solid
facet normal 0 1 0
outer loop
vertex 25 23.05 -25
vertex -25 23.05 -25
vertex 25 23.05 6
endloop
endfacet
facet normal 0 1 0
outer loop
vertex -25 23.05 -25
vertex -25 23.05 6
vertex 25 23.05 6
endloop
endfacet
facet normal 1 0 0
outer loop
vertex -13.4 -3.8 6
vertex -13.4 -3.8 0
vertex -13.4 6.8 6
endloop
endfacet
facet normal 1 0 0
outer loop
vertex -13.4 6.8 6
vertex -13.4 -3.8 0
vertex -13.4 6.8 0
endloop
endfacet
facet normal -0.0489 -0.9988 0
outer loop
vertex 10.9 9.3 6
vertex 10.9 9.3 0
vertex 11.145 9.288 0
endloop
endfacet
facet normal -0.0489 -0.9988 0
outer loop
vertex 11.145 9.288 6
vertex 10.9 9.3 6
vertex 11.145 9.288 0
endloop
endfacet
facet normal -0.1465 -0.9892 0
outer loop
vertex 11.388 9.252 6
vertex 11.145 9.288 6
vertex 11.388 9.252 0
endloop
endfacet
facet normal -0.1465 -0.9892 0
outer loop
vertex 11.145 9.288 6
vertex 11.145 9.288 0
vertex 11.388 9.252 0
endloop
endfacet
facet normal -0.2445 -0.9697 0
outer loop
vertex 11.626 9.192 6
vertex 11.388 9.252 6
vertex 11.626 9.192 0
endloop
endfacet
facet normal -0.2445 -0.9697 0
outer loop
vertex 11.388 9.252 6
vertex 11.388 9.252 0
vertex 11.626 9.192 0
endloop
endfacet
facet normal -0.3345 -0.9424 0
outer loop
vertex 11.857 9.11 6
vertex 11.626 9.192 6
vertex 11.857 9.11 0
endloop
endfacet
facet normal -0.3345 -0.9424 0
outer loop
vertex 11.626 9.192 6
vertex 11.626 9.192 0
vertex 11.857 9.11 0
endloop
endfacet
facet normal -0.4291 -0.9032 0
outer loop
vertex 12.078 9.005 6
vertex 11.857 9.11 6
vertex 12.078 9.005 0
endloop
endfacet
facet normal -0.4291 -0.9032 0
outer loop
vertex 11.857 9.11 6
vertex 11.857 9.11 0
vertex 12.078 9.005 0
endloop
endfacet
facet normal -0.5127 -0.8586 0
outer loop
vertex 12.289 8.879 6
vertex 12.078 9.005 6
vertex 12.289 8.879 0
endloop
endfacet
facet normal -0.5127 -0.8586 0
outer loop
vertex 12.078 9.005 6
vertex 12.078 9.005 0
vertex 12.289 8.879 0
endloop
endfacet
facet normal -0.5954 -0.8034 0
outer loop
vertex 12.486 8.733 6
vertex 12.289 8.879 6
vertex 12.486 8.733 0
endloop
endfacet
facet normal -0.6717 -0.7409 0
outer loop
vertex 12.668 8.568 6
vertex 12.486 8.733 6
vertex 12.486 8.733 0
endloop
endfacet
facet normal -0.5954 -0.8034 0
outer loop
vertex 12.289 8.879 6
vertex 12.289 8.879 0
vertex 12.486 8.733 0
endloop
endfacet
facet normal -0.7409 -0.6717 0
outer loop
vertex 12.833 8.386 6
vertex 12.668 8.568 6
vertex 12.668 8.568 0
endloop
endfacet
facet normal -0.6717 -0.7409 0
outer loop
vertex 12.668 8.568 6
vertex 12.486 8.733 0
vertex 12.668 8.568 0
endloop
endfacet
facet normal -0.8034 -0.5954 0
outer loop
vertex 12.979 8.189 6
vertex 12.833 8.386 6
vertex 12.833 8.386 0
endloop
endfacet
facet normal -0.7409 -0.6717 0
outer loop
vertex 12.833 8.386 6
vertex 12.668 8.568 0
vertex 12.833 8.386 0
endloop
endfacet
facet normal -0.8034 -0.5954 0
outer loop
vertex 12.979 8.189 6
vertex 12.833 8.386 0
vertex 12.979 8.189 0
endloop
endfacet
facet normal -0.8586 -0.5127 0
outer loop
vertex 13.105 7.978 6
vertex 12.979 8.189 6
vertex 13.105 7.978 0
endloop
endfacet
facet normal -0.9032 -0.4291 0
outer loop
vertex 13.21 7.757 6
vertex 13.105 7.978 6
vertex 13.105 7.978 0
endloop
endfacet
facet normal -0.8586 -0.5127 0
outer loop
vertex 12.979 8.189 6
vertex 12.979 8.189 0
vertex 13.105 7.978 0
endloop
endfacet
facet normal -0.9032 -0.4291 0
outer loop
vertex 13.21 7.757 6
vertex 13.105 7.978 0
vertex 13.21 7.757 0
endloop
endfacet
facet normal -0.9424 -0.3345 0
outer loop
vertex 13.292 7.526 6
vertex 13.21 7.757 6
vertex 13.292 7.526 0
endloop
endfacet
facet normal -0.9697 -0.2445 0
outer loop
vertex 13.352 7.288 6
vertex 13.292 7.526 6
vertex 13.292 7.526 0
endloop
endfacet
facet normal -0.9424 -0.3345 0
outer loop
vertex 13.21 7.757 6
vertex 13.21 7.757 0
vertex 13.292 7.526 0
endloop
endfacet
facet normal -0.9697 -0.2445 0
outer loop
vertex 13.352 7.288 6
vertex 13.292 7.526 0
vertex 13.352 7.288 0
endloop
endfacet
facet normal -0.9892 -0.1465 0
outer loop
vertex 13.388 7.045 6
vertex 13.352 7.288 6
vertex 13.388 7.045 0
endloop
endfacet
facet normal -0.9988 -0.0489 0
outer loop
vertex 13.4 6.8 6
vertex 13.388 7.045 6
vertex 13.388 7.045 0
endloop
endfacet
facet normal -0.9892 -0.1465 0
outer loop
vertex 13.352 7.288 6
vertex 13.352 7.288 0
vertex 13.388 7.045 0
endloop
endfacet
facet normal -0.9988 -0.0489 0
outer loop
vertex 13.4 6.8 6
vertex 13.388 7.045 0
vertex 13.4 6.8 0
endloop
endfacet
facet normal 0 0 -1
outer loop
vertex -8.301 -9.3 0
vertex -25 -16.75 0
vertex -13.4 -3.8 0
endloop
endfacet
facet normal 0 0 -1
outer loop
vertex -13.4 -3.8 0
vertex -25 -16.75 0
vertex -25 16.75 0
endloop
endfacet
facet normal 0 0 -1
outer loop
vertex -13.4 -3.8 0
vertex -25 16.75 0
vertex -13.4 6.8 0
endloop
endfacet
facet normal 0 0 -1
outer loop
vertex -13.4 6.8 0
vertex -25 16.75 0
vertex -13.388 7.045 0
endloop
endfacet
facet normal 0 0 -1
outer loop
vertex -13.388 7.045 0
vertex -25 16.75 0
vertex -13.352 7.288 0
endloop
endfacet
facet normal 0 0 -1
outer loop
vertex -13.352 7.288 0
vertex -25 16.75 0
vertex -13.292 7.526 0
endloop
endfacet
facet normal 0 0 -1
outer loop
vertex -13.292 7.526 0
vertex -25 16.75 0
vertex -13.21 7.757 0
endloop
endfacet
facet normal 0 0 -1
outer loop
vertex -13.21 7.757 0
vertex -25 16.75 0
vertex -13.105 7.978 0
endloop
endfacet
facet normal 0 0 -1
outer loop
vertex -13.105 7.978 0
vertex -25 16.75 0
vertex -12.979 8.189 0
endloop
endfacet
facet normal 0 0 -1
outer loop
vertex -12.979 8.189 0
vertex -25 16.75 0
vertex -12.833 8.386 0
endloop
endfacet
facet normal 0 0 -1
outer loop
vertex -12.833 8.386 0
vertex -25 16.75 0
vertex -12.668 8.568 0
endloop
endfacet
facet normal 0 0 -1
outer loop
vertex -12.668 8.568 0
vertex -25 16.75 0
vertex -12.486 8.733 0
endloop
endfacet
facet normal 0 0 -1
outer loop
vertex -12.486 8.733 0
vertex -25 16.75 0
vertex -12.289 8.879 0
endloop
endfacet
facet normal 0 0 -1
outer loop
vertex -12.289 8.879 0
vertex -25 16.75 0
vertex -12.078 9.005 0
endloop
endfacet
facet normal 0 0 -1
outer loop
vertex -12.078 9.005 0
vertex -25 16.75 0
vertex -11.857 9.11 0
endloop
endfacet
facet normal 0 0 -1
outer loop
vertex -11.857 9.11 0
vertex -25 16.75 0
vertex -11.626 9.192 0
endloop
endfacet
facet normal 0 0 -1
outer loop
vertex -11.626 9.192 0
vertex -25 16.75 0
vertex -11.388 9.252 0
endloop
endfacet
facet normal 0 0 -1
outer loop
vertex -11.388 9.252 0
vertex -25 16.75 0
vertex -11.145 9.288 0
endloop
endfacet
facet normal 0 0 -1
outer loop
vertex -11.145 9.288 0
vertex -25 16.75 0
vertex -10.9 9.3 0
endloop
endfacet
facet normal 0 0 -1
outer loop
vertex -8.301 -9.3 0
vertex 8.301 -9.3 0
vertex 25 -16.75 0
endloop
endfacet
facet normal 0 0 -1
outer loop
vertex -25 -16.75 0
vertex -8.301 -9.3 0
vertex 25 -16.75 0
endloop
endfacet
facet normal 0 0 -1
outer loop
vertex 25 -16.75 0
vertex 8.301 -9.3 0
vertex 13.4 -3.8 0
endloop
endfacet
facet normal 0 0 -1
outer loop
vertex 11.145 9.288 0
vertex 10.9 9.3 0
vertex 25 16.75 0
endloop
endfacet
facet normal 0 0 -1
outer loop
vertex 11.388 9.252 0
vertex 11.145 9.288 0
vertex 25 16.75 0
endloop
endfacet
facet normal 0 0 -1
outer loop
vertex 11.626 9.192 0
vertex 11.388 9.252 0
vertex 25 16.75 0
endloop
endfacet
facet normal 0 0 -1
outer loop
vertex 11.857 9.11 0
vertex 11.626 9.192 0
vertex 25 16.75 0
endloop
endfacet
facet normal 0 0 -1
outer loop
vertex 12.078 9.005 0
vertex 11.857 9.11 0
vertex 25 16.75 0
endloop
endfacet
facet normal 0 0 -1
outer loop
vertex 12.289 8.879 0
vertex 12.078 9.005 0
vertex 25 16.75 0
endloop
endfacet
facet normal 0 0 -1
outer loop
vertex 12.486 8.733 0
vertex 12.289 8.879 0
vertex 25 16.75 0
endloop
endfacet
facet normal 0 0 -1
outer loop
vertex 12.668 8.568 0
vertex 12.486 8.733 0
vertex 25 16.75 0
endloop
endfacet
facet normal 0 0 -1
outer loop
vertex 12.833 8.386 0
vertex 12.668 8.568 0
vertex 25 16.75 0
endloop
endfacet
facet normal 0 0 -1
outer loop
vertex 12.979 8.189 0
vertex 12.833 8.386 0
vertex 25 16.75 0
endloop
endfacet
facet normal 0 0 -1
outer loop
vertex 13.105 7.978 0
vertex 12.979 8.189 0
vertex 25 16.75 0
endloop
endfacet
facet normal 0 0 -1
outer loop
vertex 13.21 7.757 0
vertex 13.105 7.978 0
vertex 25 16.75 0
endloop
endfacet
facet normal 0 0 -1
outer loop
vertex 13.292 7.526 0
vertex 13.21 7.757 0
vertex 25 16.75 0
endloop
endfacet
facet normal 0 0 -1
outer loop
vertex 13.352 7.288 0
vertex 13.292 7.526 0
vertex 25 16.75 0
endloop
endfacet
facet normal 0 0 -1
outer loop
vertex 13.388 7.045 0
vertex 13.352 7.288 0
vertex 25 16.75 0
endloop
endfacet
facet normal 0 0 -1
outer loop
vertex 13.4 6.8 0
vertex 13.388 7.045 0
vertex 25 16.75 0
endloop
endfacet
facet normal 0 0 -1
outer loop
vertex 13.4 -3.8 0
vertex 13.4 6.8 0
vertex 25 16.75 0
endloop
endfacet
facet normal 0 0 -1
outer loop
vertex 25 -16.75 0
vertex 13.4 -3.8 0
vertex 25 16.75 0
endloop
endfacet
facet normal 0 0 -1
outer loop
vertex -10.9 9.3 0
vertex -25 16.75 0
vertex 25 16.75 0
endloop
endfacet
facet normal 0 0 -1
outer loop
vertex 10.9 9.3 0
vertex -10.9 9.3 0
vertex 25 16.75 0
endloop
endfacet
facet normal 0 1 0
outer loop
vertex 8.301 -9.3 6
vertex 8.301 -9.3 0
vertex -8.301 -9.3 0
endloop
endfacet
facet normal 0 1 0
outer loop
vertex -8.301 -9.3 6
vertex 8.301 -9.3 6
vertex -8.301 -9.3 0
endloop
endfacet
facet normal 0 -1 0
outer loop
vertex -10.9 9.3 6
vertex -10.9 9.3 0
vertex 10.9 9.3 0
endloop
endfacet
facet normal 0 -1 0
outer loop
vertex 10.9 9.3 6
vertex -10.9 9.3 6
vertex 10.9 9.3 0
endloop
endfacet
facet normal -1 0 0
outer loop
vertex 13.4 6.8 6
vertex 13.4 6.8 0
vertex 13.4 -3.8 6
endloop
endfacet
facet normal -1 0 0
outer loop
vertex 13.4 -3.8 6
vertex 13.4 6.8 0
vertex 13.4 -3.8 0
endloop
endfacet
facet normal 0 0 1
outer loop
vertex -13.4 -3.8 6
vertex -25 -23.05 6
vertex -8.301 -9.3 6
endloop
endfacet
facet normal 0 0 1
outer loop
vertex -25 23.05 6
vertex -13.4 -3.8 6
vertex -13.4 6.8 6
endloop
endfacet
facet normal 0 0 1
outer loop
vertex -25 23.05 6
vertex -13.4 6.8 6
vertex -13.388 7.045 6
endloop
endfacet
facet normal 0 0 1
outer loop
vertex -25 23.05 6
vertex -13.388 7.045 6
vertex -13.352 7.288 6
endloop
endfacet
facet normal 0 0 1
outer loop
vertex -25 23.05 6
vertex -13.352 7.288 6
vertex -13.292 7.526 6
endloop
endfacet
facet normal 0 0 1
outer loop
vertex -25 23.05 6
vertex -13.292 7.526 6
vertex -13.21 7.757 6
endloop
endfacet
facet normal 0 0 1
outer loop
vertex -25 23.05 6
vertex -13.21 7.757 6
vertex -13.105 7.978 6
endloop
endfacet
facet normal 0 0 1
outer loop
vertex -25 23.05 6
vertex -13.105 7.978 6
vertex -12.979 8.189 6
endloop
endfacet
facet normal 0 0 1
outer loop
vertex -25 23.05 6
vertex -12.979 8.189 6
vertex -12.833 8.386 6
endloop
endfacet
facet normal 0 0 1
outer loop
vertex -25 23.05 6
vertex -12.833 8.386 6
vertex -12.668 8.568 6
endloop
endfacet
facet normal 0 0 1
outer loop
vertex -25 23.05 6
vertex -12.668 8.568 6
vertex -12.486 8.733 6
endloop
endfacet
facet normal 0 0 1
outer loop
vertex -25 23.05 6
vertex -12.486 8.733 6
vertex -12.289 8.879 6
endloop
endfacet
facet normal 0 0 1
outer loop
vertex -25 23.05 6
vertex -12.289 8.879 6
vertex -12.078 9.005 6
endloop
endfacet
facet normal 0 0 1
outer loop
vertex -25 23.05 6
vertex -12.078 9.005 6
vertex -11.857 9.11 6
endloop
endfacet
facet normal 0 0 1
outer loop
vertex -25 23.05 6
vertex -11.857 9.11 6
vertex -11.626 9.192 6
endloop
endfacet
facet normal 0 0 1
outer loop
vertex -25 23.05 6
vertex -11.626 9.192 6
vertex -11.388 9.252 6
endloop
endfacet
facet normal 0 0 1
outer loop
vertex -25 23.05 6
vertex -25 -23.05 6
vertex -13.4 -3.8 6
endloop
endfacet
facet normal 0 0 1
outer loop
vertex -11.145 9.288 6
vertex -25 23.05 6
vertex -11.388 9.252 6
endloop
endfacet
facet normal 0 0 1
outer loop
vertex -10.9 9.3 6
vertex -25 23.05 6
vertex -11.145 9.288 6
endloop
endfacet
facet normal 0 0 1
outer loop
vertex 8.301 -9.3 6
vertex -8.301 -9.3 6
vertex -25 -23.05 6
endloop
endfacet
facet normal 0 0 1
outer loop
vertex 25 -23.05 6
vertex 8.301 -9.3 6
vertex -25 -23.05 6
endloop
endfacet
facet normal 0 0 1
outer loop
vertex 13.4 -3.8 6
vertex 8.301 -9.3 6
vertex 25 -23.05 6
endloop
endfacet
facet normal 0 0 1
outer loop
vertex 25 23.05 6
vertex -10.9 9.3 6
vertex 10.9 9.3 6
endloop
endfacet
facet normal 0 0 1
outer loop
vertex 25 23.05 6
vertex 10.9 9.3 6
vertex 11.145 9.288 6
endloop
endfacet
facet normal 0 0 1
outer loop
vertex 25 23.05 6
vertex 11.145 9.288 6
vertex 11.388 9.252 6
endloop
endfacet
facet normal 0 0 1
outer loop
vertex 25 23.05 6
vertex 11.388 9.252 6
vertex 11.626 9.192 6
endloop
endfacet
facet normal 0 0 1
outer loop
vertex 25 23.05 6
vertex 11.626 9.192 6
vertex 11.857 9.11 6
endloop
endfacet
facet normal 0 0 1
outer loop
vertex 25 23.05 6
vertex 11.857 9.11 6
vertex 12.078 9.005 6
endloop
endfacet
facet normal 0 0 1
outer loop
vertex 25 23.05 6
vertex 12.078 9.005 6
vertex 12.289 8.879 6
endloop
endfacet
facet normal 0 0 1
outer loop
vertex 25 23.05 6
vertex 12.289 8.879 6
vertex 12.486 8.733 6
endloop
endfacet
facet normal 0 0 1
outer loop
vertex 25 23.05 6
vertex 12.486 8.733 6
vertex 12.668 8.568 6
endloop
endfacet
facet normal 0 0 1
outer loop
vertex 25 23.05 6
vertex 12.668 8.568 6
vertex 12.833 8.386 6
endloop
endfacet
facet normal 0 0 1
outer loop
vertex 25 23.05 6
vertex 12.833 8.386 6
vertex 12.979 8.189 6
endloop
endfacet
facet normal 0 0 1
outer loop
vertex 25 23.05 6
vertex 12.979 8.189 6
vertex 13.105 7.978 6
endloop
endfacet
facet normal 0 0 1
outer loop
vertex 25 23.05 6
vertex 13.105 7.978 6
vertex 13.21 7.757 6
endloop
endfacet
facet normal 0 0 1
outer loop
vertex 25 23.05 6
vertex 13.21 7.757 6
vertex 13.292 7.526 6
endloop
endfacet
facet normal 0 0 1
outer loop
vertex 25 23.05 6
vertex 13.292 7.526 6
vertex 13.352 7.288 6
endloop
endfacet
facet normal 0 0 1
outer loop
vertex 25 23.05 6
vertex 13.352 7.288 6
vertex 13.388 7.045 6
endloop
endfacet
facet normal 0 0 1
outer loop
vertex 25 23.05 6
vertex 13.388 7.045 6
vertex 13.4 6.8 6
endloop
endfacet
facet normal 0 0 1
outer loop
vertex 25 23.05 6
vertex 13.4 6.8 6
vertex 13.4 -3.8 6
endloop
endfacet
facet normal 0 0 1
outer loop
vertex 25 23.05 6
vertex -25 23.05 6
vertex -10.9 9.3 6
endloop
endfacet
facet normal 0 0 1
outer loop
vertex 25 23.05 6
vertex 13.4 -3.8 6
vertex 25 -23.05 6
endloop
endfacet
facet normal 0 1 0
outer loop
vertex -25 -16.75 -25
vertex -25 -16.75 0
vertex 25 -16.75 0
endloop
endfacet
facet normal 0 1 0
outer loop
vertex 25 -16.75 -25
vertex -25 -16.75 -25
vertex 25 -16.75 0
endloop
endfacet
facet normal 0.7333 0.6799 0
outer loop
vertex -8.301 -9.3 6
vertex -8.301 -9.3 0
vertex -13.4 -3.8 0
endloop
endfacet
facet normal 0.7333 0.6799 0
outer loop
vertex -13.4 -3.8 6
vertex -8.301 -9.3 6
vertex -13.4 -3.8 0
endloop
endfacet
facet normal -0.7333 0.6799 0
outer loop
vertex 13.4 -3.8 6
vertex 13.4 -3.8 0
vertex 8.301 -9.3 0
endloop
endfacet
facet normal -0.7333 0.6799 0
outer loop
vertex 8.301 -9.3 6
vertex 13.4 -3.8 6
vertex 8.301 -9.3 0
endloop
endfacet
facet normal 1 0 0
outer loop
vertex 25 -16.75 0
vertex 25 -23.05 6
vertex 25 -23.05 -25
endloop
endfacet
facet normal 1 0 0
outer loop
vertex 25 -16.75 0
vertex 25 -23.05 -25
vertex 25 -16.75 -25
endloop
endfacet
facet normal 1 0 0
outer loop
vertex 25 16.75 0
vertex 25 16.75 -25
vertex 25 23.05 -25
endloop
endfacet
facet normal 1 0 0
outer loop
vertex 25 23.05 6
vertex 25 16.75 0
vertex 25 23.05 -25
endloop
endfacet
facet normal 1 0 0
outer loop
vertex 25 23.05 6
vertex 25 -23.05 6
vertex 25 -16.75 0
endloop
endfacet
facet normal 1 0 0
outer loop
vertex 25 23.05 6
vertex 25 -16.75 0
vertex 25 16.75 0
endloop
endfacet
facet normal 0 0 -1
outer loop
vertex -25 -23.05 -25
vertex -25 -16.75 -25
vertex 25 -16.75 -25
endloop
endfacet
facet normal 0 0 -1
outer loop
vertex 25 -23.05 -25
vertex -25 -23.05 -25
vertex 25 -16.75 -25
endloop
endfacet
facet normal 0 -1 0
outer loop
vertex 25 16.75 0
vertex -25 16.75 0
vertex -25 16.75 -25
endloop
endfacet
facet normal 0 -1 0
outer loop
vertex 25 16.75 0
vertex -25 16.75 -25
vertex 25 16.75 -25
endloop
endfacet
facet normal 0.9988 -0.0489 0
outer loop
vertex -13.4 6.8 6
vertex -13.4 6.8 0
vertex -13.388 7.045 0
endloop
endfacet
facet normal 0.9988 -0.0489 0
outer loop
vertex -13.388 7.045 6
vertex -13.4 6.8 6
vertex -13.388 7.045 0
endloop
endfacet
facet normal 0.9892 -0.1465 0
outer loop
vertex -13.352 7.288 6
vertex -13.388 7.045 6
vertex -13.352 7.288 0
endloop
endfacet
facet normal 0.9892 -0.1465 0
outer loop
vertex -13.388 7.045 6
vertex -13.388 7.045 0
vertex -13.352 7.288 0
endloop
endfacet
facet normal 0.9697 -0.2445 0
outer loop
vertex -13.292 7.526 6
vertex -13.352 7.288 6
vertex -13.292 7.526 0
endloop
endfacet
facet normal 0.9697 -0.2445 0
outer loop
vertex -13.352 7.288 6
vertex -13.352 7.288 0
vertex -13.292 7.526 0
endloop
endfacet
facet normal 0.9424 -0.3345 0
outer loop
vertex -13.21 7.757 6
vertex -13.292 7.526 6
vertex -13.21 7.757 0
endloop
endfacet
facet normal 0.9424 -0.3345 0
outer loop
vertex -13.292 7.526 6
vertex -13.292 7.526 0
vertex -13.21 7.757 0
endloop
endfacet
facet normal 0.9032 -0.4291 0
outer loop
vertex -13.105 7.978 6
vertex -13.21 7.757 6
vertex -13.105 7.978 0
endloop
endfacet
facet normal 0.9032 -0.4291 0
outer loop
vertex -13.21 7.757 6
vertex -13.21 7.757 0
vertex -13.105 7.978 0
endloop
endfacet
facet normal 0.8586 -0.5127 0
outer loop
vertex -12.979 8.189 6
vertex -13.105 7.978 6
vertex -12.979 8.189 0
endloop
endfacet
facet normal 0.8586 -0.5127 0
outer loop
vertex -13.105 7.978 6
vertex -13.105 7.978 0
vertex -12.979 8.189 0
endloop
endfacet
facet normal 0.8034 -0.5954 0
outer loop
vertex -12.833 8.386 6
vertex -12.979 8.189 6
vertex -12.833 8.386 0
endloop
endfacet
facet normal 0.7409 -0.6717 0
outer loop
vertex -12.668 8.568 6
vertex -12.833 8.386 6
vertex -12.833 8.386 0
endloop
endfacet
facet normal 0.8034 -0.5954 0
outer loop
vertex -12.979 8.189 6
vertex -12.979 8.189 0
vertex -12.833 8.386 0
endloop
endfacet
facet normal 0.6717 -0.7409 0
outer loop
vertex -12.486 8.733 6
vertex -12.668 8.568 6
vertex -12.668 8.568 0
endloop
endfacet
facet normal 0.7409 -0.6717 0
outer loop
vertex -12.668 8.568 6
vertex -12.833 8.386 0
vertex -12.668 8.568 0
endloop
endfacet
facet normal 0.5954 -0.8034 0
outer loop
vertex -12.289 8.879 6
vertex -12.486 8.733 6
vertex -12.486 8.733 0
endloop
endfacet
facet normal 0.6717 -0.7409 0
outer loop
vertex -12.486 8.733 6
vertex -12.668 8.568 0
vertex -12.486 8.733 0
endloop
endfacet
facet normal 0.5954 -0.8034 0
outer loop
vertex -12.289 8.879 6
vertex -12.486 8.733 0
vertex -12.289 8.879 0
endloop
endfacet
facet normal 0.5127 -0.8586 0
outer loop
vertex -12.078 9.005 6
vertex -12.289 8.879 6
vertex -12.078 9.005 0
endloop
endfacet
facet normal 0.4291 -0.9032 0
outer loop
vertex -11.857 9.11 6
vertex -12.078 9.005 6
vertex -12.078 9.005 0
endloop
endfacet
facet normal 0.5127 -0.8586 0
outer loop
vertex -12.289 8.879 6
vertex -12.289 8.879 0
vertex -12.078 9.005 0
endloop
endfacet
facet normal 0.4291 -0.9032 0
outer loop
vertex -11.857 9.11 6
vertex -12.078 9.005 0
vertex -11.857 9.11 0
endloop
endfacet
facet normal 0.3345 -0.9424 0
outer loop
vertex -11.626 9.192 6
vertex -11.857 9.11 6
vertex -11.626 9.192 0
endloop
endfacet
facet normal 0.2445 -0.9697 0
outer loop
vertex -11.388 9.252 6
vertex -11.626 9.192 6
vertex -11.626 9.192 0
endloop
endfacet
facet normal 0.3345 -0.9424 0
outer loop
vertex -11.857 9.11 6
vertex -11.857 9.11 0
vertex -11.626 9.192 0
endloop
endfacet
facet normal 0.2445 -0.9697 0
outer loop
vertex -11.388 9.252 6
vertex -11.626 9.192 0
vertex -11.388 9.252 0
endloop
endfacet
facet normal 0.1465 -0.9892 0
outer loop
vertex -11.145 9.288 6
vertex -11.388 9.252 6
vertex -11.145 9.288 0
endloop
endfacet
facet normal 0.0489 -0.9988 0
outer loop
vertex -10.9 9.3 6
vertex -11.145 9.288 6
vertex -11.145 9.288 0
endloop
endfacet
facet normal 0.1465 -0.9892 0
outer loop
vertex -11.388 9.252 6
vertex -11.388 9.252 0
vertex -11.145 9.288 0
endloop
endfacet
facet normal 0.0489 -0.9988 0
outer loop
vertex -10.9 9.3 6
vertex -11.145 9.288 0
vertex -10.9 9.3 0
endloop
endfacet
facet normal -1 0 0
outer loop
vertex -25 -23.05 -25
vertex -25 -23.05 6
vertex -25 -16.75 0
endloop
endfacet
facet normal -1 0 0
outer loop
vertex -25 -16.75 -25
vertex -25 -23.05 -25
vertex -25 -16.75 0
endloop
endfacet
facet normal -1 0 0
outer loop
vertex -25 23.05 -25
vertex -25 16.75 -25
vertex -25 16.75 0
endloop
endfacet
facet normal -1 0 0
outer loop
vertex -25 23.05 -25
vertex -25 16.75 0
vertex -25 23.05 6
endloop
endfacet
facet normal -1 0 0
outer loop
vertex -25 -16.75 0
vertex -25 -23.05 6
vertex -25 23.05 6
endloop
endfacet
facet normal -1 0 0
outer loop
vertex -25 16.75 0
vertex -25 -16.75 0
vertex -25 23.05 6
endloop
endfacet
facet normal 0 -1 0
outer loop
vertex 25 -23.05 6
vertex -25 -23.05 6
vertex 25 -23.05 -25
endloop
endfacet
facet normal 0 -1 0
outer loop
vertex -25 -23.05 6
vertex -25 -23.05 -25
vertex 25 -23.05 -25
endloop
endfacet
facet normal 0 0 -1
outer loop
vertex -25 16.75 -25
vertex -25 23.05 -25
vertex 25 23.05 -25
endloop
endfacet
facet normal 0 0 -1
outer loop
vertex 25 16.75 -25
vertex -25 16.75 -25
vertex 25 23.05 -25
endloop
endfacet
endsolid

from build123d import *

# Parameters (mm, degrees)
F0_W     = 50
F0_H     = 46.1
F0_R     = 1.75
F1_DEPTH = 6
F2_W     = 50
F2_H     = 6.3
F3_DEPTH = 25


with BuildPart() as f1:
    # F0 (on Top) → F1 (new body)
    with BuildSketch(Plane.XY):
        Rectangle(F0_W, F0_H)
        with Locations((-19.95, 0)):
            Circle(F0_R, mode=Mode.SUBTRACT)
        with BuildLine():
            ThreePointArc((-13.4, 6.8), (-12.667767, 8.567767), (-10.9, 9.3))
            Line((-10.9, 9.3), (10.9, 9.3))
            ThreePointArc((10.9, 9.3), (12.667767, 8.567767), (13.4, 6.8))
            Line((13.4, 6.8), (13.4, -3.8))
            Line((13.4, -3.8), (8.30098, -9.3))
            Line((8.30098, -9.3), (-8.30098, -9.3))
            Line((-8.30098, -9.3), (-13.4, -3.8))
            Line((-13.4, -3.8), (-13.4, 6.8))
        make_face(mode=Mode.SUBTRACT)
        with Locations((19.95, 0)):
            Circle(F0_R, mode=Mode.SUBTRACT)
        with Locations((-19.95, 0)):
            Circle(F0_R)
        with Locations((19.95, 0)):
            Circle(F0_R)
    extrude(amount=F1_DEPTH)

    # F2 (on face) → F3 (join)
    with BuildSketch(Plane.XY):
        with Locations((0, 19.9)):
            Rectangle(F2_W, F2_H)
        with Locations((0, -19.9)):
            Rectangle(F2_W, F2_H)
    extrude(amount=-F3_DEPTH)


solid = f1.part
